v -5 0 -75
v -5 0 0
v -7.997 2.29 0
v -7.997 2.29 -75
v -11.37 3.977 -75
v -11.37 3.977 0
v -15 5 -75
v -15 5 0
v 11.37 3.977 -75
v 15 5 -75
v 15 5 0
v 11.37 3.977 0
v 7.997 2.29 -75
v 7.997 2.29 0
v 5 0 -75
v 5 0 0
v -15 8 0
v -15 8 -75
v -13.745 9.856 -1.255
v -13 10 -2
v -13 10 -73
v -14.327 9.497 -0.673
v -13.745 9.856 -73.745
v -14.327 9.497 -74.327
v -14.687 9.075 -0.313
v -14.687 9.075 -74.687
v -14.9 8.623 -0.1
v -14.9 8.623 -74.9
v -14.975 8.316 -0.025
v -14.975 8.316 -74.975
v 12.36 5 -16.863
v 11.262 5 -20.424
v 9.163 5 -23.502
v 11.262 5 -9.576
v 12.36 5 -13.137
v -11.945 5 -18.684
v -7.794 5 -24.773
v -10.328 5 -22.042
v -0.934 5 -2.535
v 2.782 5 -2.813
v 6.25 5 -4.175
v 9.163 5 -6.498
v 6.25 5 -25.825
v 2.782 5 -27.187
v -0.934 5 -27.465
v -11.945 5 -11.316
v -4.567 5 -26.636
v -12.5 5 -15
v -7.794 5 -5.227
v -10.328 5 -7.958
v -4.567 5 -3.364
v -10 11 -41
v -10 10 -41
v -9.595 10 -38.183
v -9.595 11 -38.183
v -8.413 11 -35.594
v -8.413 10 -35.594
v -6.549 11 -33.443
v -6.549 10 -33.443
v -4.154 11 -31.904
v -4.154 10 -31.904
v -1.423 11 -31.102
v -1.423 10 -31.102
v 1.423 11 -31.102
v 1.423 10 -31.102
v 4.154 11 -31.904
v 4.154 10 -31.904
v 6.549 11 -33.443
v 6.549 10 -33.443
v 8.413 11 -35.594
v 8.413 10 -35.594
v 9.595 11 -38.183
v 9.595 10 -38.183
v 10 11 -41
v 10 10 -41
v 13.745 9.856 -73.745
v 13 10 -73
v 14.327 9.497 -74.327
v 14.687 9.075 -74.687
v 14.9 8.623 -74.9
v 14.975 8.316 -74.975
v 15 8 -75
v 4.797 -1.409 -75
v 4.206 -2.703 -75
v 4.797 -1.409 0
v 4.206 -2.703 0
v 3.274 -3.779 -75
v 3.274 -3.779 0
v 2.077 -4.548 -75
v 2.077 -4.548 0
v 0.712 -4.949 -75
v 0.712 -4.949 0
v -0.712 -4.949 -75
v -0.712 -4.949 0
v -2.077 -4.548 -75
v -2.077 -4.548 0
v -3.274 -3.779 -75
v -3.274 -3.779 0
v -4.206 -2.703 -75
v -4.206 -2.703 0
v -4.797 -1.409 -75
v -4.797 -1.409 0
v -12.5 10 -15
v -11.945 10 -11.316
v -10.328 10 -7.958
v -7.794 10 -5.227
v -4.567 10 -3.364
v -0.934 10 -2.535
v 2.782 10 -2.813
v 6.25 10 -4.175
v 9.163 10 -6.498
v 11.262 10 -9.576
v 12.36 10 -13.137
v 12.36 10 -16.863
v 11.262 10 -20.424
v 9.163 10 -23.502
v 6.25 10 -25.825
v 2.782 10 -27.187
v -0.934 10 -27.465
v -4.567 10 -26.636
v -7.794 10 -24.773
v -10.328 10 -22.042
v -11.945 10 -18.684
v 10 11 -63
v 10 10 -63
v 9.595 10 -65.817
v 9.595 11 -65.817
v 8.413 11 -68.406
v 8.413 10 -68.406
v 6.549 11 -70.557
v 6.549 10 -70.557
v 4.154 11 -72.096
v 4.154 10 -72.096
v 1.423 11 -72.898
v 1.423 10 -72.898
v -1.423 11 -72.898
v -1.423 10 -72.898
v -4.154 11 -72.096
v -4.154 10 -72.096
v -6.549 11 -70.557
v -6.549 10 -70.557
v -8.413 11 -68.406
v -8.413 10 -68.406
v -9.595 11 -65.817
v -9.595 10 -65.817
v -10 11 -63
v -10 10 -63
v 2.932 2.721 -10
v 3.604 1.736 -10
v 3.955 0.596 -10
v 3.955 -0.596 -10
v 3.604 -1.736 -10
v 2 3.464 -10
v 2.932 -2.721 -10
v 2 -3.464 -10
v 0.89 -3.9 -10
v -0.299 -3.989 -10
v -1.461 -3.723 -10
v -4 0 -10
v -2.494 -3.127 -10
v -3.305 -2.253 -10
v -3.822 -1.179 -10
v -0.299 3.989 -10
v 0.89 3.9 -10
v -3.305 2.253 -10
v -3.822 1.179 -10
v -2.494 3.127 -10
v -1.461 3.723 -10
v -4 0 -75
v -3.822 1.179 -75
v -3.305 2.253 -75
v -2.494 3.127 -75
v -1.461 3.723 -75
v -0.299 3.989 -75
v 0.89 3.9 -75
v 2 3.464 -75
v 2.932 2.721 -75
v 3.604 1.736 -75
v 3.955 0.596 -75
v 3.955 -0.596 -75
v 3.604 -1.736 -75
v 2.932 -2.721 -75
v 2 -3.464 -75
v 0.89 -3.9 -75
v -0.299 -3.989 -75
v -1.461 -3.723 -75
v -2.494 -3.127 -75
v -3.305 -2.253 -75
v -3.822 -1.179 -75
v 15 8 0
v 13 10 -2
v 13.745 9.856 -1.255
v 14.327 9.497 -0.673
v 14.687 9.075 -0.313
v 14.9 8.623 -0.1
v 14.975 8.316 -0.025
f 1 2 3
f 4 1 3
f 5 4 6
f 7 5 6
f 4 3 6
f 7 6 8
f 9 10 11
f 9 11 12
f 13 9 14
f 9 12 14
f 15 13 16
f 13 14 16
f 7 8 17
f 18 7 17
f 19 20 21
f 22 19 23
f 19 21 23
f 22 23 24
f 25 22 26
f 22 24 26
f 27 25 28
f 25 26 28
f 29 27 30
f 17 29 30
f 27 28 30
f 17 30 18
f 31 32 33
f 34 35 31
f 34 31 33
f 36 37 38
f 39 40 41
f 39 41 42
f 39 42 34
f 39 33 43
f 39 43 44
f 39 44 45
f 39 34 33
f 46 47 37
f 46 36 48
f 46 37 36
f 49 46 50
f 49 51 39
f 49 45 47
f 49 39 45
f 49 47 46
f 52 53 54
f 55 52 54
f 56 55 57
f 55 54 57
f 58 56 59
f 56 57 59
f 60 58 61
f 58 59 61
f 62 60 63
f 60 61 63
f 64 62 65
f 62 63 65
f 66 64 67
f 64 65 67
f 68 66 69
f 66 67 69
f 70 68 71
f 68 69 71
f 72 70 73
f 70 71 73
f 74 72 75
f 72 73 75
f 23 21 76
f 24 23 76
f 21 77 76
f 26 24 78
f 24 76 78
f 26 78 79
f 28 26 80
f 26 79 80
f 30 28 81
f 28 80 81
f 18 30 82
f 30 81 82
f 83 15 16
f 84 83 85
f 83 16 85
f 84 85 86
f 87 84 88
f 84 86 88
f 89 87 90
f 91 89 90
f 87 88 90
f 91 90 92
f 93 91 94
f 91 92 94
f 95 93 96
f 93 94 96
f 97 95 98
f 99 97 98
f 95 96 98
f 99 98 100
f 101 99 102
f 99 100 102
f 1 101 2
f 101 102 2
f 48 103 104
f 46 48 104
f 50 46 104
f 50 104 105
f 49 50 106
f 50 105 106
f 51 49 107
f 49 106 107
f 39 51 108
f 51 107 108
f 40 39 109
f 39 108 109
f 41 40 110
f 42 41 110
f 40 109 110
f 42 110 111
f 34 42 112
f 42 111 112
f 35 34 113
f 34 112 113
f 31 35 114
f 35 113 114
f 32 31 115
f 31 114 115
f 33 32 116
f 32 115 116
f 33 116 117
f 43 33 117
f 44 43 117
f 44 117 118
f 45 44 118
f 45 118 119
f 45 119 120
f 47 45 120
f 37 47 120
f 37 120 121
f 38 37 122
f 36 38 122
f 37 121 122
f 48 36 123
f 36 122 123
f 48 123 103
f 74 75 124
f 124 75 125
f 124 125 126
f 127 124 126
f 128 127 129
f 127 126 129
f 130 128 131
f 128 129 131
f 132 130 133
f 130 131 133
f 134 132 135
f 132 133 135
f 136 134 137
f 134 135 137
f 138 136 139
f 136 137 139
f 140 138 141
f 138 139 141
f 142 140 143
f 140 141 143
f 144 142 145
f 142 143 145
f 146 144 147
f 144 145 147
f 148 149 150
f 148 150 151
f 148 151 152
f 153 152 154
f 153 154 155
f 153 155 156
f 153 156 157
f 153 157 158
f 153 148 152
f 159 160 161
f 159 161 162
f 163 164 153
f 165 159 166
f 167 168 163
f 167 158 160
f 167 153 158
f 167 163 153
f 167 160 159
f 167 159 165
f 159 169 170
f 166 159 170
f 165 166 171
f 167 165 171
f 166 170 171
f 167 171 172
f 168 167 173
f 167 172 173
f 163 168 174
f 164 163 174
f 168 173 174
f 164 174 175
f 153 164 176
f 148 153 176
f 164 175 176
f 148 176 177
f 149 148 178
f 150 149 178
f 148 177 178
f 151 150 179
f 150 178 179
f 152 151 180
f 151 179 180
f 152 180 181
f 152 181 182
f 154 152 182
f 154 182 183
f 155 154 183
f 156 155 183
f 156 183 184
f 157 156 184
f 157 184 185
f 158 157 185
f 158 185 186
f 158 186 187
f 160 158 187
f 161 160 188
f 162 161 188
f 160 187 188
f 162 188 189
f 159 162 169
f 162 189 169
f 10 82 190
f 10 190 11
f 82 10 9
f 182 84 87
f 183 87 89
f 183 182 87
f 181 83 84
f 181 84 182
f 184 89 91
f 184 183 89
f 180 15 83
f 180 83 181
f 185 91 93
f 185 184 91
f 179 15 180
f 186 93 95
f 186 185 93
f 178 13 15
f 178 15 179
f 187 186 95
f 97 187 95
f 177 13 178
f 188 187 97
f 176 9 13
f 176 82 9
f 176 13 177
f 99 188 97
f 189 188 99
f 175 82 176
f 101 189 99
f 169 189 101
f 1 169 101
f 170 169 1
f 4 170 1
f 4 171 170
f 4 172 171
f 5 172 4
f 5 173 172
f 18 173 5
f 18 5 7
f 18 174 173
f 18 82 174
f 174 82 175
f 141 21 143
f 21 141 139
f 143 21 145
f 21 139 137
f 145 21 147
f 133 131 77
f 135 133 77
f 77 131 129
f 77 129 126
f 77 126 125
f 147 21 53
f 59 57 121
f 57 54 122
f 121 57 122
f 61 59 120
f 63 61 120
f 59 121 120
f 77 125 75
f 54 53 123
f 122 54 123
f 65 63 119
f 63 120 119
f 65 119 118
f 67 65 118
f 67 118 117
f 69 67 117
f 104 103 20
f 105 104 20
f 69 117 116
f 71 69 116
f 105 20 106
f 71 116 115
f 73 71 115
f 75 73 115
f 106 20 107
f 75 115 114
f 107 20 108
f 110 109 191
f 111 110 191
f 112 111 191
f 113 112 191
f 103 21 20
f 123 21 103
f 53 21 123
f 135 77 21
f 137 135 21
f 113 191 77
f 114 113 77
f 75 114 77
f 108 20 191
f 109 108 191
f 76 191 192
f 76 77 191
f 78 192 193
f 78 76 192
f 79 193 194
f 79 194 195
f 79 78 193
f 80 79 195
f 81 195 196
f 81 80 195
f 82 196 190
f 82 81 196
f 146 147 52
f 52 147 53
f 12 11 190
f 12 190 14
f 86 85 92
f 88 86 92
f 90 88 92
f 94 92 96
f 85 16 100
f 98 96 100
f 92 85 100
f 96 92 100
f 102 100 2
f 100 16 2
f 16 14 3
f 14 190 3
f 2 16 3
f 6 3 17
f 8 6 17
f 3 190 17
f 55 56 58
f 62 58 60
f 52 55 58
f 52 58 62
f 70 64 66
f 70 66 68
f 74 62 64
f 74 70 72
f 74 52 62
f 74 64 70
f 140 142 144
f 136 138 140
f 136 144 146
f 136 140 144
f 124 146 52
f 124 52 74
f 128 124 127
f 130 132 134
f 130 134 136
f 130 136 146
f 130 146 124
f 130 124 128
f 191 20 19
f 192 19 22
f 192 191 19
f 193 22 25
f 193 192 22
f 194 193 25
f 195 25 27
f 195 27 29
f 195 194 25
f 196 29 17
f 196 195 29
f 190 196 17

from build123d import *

# Parameters (mm, degrees)
BOSS_EXTRUDE1_DEPTH = 75
SKETCH3_R           = 4
CUT_EXTRUDE1_DEPTH  = 65
BOSS_EXTRUDE2_DEPTH = 1
SKETCH5_R           = 12.5
CUT_EXTRUDE2_DEPTH  = 5
FILLET1_R           = 2


with BuildPart() as part:
    # Sketch1 → Boss-Extrude1 (new body)
    with BuildSketch(Plane.XY):
        with BuildLine():
            Line((-15, 10), (15, 10))
            Line((15, 10), (15, 5))
            ThreePointArc((15, 5), (9.643510109, 3.212979783), (5, 0))
            ThreePointArc((5, 0), (0, -5), (-5, 0))
            ThreePointArc((-5, 0), (-9.643510109, 3.212979783), (-15, 5))
            Line((-15, 5), (-15, 10))
        make_face()
    extrude(amount=-BOSS_EXTRUDE1_DEPTH)

    # Sketch3 → Cut-Extrude1 (cut)
    with BuildSketch(Plane(origin=(0, 0, -75), x_dir=(-1, 0, 0), z_dir=(0, 0, -1))):
        Circle(SKETCH3_R)
    extrude(amount=-CUT_EXTRUDE1_DEPTH, mode=Mode.SUBTRACT)

    # Sketch4 → Boss-Extrude2 (add)
    with BuildSketch(Plane(origin=(0, 10, 0), x_dir=(1, 0, 0), z_dir=(0, 1, 0))):
        with BuildLine():
            Line((-10, 63), (-10, 41))
            ThreePointArc((-10, 41), (0, 31), (10, 41))
            Line((10, 41), (10, 63))
            ThreePointArc((10, 63), (0, 73), (-10, 63))
        make_face()
    extrude(amount=BOSS_EXTRUDE2_DEPTH)

    # Sketch5 → Cut-Extrude2 (cut)
    with BuildSketch(Plane(origin=(0, 10, 0), x_dir=(1, 0, 0), z_dir=(0, 1, 0))):
        with Locations(Location((0, 15, 0), (0, 0, 180))):
            Circle(SKETCH5_R)
    extrude(amount=-CUT_EXTRUDE2_DEPTH, mode=Mode.SUBTRACT)

    # Fillet1
    fillet1_edges = [part.edges().sort_by_distance(p)[0] for p in [
        (-15, 10, -37.5),
        (15, 10, -37.5),
        (0, 10, -75),
        (0, 10, 0),
    ]]
    fillet(fillet1_edges, radius=FILLET1_R - 0.0001)  # a hair under: the kernel refuses the full size


solid = part.part
